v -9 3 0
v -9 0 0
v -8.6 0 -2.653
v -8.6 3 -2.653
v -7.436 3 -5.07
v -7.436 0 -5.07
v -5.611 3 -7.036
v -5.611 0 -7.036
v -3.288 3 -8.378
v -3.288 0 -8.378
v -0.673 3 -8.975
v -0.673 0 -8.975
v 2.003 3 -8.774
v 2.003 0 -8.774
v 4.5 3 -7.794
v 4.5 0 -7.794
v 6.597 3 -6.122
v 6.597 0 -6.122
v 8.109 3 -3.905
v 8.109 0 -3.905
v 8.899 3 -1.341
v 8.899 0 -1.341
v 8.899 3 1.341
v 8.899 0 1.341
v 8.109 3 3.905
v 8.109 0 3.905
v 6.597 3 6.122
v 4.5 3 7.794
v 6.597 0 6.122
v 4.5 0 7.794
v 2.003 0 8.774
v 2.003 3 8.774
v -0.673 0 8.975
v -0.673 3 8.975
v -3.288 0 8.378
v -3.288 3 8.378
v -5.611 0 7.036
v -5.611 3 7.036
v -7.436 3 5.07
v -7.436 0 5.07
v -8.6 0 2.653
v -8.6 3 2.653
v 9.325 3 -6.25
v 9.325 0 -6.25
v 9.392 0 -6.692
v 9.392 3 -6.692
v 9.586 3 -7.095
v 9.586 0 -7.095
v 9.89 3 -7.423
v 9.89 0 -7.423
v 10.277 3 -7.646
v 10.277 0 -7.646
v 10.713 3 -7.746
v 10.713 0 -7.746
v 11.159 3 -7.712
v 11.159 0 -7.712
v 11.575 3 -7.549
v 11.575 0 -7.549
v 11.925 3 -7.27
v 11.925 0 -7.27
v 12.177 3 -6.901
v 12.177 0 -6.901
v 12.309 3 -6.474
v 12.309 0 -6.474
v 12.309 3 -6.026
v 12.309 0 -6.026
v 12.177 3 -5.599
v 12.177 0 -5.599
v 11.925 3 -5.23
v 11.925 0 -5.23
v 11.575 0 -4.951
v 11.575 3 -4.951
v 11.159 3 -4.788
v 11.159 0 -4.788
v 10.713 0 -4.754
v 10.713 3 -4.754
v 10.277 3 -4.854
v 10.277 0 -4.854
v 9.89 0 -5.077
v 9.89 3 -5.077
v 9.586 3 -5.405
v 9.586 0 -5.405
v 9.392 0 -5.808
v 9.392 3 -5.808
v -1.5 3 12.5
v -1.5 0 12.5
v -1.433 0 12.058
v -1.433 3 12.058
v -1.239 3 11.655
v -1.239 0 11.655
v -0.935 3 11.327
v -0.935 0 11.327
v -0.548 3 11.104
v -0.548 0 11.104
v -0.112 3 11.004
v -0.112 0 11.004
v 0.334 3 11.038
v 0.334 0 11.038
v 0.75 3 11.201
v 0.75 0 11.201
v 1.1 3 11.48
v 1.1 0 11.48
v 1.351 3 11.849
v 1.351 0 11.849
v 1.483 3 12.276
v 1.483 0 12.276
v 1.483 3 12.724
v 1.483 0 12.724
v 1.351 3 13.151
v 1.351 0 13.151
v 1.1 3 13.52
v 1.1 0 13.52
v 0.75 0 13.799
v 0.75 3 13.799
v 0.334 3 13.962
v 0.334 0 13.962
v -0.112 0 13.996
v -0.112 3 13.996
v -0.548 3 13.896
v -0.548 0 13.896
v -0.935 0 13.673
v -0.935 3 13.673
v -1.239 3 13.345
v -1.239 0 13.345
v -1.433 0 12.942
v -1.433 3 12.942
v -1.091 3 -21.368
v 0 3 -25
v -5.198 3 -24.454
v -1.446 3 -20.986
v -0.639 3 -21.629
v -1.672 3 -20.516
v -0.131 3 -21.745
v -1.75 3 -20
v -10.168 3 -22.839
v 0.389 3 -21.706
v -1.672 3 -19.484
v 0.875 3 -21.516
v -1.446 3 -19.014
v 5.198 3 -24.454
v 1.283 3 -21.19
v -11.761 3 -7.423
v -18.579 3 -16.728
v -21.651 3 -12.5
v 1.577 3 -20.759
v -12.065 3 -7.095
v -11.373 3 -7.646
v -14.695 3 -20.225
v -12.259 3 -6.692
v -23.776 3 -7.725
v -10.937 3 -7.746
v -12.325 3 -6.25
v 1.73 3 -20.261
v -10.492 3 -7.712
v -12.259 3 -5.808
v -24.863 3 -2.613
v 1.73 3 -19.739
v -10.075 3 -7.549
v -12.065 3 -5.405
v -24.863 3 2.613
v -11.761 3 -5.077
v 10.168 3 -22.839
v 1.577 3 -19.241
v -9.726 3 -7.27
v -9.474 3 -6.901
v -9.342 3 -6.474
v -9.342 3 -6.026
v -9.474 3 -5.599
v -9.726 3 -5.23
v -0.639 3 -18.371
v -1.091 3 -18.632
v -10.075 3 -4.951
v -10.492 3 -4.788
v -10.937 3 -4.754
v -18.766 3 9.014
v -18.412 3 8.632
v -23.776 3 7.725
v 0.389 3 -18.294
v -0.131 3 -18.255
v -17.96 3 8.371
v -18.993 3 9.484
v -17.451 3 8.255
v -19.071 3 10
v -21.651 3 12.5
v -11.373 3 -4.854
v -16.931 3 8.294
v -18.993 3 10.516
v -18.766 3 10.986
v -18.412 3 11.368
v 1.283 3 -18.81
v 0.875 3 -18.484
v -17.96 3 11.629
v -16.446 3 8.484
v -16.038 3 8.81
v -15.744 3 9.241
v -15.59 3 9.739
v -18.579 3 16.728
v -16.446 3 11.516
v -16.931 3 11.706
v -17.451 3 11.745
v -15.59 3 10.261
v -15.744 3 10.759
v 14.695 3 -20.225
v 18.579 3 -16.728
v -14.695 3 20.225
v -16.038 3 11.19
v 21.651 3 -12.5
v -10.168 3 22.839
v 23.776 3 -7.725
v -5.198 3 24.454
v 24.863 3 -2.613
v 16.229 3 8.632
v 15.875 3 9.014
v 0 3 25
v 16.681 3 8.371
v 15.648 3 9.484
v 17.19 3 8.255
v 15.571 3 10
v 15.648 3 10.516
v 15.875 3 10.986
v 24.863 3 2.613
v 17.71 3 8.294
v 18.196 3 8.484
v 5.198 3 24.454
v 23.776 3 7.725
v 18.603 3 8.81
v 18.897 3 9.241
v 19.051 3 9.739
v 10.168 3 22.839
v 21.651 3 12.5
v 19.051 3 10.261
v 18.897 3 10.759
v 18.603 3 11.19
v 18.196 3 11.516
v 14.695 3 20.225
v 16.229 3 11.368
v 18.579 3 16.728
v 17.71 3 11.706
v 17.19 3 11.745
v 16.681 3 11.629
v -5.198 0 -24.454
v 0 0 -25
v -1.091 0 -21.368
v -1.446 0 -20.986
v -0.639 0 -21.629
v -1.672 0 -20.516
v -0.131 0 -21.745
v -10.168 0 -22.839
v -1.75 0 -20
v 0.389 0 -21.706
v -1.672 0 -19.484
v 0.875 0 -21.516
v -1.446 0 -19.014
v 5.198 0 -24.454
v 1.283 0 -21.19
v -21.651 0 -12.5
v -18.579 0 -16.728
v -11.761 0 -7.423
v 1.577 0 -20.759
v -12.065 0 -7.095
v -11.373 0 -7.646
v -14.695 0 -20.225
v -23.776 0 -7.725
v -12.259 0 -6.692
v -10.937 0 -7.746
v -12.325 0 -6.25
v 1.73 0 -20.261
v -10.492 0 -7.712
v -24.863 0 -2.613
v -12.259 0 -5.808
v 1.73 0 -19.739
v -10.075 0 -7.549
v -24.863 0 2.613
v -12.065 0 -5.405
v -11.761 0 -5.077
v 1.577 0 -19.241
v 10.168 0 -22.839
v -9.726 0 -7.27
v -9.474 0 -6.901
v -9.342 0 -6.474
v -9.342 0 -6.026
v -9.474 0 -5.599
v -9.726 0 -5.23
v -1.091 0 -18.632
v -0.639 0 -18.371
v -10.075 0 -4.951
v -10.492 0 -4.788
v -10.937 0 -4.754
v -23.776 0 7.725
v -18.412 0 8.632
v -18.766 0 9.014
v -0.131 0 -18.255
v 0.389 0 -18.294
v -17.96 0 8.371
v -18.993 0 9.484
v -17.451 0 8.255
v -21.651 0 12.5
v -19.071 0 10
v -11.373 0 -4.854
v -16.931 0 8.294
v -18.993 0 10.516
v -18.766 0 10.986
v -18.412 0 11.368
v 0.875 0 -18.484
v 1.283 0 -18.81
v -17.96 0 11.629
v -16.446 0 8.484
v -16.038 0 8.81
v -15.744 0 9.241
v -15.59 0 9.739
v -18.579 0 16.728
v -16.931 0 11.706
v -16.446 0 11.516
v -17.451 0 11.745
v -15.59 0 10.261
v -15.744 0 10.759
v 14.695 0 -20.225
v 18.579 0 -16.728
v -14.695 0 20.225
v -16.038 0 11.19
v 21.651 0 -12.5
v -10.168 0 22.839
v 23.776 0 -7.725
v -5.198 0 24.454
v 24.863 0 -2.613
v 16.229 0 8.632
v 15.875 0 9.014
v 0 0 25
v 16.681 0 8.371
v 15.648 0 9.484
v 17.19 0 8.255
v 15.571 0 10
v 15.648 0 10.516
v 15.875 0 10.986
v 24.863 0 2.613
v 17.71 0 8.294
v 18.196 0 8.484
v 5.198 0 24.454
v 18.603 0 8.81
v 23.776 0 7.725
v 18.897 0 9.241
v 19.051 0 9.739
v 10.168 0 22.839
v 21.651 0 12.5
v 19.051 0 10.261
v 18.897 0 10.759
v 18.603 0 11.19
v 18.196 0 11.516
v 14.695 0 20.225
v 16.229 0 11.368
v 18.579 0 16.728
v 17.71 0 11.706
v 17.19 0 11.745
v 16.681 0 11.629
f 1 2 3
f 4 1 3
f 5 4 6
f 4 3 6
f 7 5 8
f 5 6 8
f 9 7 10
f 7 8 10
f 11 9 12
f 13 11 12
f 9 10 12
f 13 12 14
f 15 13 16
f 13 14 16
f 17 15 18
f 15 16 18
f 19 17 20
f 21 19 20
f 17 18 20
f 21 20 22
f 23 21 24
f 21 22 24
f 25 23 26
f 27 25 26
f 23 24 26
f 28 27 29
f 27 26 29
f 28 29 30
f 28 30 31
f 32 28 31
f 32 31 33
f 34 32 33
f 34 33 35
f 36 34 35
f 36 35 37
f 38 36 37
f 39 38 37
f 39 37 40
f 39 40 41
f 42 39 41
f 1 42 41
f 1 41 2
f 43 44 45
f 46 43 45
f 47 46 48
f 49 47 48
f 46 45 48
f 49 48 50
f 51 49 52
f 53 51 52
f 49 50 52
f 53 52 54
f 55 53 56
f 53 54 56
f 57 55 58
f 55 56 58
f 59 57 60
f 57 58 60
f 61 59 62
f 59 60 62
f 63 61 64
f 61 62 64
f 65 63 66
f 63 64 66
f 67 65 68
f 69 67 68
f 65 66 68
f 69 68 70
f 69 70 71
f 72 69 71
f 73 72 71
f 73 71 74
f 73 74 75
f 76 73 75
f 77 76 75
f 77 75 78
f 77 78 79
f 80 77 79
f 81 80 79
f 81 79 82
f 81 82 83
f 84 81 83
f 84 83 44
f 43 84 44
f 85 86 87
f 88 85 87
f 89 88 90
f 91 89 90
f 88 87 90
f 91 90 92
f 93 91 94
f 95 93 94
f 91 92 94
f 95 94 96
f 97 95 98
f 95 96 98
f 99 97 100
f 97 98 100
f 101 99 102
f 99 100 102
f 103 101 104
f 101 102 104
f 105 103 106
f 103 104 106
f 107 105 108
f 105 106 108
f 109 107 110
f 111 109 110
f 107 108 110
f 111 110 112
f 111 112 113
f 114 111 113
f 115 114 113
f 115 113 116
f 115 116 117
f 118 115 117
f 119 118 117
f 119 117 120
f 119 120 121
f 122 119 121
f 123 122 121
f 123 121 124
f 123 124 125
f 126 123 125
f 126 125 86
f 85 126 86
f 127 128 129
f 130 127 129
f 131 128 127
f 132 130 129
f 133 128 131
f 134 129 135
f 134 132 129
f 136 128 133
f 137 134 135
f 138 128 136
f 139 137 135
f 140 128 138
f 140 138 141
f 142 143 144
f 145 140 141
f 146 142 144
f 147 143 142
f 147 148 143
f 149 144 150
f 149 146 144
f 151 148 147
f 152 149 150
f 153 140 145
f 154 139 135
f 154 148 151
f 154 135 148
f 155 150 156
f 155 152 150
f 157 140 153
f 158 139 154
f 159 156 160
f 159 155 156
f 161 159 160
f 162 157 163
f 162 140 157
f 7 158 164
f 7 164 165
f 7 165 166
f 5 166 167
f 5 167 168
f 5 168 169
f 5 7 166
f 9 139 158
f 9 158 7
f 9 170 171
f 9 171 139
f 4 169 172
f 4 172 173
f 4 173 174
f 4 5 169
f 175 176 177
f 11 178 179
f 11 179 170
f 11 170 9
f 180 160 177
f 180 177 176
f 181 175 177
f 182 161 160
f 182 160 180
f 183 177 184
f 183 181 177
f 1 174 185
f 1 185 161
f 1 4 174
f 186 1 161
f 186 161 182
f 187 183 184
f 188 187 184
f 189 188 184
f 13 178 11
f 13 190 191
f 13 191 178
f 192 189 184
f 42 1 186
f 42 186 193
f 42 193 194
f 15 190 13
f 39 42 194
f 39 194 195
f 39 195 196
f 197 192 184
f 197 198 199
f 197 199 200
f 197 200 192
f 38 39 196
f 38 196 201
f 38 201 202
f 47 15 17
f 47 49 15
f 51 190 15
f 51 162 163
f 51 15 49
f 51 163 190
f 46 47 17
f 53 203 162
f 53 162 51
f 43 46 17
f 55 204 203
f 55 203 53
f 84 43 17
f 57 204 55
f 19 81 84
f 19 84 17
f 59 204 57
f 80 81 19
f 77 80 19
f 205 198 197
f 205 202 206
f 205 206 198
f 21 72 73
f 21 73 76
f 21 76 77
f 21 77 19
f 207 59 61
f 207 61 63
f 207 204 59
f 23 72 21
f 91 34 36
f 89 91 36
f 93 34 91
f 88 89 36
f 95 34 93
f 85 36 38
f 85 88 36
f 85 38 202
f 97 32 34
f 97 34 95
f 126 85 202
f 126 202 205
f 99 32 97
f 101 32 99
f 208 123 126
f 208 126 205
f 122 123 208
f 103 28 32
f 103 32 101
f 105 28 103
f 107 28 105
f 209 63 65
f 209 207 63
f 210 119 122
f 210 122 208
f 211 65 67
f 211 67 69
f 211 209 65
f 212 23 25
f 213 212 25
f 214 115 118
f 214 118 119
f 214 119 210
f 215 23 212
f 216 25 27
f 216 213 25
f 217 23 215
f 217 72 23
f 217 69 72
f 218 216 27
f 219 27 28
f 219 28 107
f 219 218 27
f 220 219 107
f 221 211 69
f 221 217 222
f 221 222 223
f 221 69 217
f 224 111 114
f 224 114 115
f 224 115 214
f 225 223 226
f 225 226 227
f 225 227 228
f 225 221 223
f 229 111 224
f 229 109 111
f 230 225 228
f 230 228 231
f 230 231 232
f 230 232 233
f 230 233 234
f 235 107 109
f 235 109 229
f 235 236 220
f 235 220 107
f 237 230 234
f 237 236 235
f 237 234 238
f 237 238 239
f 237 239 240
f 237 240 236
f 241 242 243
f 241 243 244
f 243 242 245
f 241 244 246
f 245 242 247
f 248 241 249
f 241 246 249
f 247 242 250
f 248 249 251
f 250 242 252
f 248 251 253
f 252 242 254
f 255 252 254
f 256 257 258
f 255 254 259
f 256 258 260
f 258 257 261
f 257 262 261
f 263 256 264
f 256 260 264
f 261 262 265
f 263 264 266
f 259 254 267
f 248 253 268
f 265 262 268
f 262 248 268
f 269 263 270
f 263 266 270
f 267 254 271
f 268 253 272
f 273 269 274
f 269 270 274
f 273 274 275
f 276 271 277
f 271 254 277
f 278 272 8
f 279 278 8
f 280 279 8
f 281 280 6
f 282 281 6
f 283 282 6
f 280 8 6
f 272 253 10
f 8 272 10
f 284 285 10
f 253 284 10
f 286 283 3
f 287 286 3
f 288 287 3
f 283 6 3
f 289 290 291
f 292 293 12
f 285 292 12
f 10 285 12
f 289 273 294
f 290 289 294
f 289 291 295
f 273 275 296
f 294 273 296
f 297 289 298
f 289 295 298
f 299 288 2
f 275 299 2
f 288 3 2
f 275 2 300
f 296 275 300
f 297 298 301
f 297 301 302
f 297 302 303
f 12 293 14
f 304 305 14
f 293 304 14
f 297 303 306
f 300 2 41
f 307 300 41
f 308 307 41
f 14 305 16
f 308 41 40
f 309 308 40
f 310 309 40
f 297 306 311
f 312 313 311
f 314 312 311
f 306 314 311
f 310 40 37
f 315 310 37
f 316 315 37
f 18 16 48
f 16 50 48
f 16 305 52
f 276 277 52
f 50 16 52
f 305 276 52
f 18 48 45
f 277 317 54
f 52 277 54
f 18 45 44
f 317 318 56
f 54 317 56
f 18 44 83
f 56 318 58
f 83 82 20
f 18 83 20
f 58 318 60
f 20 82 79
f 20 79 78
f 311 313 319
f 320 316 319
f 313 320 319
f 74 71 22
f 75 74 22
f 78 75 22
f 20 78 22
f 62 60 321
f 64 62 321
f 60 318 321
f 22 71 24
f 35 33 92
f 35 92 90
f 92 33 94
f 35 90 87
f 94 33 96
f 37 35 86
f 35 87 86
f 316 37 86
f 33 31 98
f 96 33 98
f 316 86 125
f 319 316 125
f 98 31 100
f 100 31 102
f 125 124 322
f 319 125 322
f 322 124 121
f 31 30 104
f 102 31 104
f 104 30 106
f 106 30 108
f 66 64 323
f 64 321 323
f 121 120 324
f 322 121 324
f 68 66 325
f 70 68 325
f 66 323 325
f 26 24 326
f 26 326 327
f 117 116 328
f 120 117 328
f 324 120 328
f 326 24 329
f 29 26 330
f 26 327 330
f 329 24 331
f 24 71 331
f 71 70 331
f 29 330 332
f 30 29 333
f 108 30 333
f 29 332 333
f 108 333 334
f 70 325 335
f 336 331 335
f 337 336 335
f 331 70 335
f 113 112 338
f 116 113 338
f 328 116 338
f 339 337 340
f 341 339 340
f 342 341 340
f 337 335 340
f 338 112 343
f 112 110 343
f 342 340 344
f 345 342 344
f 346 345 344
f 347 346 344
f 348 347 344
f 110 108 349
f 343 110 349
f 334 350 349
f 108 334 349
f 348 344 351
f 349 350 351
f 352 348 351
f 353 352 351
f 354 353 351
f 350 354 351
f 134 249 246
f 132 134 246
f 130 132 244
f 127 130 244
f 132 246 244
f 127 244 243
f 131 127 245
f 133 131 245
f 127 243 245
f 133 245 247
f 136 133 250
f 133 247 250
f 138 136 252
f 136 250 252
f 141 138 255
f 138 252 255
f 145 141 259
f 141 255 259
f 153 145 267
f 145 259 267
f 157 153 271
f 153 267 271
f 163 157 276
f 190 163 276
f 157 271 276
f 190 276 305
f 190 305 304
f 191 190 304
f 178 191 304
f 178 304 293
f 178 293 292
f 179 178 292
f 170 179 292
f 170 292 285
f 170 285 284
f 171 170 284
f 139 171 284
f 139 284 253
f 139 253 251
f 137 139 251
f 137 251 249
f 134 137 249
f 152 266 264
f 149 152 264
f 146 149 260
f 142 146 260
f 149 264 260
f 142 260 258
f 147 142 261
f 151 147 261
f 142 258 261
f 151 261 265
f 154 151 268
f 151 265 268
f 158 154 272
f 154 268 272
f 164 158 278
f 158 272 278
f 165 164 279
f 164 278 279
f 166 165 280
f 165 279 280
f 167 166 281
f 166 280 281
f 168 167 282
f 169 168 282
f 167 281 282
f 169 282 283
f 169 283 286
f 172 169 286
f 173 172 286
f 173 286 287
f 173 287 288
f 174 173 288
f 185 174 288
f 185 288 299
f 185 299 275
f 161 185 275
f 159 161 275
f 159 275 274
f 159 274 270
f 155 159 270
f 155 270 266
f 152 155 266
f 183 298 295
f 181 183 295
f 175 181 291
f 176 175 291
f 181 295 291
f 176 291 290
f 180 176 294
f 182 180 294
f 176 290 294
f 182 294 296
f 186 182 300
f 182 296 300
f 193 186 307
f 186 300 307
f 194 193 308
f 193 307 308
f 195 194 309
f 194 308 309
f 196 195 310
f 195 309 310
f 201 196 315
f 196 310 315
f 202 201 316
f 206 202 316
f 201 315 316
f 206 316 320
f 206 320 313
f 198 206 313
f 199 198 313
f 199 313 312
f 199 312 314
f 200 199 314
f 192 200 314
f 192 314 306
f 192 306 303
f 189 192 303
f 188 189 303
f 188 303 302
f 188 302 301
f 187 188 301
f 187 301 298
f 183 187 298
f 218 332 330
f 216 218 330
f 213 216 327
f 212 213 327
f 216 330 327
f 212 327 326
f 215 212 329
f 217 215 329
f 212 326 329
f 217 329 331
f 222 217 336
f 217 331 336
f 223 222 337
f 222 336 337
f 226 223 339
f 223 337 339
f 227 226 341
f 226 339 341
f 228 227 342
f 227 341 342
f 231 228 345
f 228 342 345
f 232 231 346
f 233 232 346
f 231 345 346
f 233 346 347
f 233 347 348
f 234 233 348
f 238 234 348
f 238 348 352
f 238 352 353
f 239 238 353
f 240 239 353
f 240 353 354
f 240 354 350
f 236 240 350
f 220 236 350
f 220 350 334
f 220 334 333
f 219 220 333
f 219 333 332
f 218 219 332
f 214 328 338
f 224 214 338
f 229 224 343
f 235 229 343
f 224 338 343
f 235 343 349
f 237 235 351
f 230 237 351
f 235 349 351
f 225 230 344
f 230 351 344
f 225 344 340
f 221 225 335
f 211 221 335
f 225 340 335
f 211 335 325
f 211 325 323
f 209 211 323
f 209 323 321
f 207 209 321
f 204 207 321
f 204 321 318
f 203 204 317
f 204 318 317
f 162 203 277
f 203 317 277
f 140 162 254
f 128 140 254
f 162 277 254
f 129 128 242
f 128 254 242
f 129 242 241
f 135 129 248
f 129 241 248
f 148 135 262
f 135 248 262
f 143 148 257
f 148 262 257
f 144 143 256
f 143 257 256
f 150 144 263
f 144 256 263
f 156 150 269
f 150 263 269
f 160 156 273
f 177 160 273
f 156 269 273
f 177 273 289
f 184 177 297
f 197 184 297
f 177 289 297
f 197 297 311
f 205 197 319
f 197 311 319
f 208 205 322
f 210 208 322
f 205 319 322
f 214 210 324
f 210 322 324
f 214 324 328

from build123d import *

# Parameters (mm, degrees)
SKETCH_1_R      = 25
EXTRUDE_1_DEPTH = 3
HOLE_WIZARD_1_D = 3.5
HOLE_WIZARD_2_D = 18
HOLE_WIZARD_3_D = 3


with BuildPart() as part:
    # 草图1 → 凸台-拉伸1 (new body)
    with BuildSketch(Plane(origin=(0, 0, 0), x_dir=(1, 0, 0), z_dir=(0, 1, 0))):
        with Locations(Location((0, 0, 0), (0, 0, 270))):
            Circle(SKETCH_1_R)
    extrude(amount=EXTRUDE_1_DEPTH)

    # 孔1 (through all)
    with Locations(Plane(origin=(0, 3, 0), x_dir=(1, 0, 0), z_dir=(0, 1, 0))):
        with Locations((0, 20), (-17.320508076, -10), (17.320508076, -10)):
            Hole(HOLE_WIZARD_1_D / 2)

    # 孔2 (through all)
    with Locations(Plane(origin=(0, 3, 0), x_dir=(1, 0, 0), z_dir=(0, 1, 0))):
        with Locations((0, 0)):
            Hole(HOLE_WIZARD_2_D / 2)

    # 孔3 (through all)
    with Locations(Plane(origin=(0, 3, 0), x_dir=(1, 0, 0), z_dir=(0, 1, 0))):
        with Locations((-10.825317547, 6.25), (0, -12.5), (10.825317547, 6.25)):
            Hole(HOLE_WIZARD_3_D / 2)


solid = part.part
